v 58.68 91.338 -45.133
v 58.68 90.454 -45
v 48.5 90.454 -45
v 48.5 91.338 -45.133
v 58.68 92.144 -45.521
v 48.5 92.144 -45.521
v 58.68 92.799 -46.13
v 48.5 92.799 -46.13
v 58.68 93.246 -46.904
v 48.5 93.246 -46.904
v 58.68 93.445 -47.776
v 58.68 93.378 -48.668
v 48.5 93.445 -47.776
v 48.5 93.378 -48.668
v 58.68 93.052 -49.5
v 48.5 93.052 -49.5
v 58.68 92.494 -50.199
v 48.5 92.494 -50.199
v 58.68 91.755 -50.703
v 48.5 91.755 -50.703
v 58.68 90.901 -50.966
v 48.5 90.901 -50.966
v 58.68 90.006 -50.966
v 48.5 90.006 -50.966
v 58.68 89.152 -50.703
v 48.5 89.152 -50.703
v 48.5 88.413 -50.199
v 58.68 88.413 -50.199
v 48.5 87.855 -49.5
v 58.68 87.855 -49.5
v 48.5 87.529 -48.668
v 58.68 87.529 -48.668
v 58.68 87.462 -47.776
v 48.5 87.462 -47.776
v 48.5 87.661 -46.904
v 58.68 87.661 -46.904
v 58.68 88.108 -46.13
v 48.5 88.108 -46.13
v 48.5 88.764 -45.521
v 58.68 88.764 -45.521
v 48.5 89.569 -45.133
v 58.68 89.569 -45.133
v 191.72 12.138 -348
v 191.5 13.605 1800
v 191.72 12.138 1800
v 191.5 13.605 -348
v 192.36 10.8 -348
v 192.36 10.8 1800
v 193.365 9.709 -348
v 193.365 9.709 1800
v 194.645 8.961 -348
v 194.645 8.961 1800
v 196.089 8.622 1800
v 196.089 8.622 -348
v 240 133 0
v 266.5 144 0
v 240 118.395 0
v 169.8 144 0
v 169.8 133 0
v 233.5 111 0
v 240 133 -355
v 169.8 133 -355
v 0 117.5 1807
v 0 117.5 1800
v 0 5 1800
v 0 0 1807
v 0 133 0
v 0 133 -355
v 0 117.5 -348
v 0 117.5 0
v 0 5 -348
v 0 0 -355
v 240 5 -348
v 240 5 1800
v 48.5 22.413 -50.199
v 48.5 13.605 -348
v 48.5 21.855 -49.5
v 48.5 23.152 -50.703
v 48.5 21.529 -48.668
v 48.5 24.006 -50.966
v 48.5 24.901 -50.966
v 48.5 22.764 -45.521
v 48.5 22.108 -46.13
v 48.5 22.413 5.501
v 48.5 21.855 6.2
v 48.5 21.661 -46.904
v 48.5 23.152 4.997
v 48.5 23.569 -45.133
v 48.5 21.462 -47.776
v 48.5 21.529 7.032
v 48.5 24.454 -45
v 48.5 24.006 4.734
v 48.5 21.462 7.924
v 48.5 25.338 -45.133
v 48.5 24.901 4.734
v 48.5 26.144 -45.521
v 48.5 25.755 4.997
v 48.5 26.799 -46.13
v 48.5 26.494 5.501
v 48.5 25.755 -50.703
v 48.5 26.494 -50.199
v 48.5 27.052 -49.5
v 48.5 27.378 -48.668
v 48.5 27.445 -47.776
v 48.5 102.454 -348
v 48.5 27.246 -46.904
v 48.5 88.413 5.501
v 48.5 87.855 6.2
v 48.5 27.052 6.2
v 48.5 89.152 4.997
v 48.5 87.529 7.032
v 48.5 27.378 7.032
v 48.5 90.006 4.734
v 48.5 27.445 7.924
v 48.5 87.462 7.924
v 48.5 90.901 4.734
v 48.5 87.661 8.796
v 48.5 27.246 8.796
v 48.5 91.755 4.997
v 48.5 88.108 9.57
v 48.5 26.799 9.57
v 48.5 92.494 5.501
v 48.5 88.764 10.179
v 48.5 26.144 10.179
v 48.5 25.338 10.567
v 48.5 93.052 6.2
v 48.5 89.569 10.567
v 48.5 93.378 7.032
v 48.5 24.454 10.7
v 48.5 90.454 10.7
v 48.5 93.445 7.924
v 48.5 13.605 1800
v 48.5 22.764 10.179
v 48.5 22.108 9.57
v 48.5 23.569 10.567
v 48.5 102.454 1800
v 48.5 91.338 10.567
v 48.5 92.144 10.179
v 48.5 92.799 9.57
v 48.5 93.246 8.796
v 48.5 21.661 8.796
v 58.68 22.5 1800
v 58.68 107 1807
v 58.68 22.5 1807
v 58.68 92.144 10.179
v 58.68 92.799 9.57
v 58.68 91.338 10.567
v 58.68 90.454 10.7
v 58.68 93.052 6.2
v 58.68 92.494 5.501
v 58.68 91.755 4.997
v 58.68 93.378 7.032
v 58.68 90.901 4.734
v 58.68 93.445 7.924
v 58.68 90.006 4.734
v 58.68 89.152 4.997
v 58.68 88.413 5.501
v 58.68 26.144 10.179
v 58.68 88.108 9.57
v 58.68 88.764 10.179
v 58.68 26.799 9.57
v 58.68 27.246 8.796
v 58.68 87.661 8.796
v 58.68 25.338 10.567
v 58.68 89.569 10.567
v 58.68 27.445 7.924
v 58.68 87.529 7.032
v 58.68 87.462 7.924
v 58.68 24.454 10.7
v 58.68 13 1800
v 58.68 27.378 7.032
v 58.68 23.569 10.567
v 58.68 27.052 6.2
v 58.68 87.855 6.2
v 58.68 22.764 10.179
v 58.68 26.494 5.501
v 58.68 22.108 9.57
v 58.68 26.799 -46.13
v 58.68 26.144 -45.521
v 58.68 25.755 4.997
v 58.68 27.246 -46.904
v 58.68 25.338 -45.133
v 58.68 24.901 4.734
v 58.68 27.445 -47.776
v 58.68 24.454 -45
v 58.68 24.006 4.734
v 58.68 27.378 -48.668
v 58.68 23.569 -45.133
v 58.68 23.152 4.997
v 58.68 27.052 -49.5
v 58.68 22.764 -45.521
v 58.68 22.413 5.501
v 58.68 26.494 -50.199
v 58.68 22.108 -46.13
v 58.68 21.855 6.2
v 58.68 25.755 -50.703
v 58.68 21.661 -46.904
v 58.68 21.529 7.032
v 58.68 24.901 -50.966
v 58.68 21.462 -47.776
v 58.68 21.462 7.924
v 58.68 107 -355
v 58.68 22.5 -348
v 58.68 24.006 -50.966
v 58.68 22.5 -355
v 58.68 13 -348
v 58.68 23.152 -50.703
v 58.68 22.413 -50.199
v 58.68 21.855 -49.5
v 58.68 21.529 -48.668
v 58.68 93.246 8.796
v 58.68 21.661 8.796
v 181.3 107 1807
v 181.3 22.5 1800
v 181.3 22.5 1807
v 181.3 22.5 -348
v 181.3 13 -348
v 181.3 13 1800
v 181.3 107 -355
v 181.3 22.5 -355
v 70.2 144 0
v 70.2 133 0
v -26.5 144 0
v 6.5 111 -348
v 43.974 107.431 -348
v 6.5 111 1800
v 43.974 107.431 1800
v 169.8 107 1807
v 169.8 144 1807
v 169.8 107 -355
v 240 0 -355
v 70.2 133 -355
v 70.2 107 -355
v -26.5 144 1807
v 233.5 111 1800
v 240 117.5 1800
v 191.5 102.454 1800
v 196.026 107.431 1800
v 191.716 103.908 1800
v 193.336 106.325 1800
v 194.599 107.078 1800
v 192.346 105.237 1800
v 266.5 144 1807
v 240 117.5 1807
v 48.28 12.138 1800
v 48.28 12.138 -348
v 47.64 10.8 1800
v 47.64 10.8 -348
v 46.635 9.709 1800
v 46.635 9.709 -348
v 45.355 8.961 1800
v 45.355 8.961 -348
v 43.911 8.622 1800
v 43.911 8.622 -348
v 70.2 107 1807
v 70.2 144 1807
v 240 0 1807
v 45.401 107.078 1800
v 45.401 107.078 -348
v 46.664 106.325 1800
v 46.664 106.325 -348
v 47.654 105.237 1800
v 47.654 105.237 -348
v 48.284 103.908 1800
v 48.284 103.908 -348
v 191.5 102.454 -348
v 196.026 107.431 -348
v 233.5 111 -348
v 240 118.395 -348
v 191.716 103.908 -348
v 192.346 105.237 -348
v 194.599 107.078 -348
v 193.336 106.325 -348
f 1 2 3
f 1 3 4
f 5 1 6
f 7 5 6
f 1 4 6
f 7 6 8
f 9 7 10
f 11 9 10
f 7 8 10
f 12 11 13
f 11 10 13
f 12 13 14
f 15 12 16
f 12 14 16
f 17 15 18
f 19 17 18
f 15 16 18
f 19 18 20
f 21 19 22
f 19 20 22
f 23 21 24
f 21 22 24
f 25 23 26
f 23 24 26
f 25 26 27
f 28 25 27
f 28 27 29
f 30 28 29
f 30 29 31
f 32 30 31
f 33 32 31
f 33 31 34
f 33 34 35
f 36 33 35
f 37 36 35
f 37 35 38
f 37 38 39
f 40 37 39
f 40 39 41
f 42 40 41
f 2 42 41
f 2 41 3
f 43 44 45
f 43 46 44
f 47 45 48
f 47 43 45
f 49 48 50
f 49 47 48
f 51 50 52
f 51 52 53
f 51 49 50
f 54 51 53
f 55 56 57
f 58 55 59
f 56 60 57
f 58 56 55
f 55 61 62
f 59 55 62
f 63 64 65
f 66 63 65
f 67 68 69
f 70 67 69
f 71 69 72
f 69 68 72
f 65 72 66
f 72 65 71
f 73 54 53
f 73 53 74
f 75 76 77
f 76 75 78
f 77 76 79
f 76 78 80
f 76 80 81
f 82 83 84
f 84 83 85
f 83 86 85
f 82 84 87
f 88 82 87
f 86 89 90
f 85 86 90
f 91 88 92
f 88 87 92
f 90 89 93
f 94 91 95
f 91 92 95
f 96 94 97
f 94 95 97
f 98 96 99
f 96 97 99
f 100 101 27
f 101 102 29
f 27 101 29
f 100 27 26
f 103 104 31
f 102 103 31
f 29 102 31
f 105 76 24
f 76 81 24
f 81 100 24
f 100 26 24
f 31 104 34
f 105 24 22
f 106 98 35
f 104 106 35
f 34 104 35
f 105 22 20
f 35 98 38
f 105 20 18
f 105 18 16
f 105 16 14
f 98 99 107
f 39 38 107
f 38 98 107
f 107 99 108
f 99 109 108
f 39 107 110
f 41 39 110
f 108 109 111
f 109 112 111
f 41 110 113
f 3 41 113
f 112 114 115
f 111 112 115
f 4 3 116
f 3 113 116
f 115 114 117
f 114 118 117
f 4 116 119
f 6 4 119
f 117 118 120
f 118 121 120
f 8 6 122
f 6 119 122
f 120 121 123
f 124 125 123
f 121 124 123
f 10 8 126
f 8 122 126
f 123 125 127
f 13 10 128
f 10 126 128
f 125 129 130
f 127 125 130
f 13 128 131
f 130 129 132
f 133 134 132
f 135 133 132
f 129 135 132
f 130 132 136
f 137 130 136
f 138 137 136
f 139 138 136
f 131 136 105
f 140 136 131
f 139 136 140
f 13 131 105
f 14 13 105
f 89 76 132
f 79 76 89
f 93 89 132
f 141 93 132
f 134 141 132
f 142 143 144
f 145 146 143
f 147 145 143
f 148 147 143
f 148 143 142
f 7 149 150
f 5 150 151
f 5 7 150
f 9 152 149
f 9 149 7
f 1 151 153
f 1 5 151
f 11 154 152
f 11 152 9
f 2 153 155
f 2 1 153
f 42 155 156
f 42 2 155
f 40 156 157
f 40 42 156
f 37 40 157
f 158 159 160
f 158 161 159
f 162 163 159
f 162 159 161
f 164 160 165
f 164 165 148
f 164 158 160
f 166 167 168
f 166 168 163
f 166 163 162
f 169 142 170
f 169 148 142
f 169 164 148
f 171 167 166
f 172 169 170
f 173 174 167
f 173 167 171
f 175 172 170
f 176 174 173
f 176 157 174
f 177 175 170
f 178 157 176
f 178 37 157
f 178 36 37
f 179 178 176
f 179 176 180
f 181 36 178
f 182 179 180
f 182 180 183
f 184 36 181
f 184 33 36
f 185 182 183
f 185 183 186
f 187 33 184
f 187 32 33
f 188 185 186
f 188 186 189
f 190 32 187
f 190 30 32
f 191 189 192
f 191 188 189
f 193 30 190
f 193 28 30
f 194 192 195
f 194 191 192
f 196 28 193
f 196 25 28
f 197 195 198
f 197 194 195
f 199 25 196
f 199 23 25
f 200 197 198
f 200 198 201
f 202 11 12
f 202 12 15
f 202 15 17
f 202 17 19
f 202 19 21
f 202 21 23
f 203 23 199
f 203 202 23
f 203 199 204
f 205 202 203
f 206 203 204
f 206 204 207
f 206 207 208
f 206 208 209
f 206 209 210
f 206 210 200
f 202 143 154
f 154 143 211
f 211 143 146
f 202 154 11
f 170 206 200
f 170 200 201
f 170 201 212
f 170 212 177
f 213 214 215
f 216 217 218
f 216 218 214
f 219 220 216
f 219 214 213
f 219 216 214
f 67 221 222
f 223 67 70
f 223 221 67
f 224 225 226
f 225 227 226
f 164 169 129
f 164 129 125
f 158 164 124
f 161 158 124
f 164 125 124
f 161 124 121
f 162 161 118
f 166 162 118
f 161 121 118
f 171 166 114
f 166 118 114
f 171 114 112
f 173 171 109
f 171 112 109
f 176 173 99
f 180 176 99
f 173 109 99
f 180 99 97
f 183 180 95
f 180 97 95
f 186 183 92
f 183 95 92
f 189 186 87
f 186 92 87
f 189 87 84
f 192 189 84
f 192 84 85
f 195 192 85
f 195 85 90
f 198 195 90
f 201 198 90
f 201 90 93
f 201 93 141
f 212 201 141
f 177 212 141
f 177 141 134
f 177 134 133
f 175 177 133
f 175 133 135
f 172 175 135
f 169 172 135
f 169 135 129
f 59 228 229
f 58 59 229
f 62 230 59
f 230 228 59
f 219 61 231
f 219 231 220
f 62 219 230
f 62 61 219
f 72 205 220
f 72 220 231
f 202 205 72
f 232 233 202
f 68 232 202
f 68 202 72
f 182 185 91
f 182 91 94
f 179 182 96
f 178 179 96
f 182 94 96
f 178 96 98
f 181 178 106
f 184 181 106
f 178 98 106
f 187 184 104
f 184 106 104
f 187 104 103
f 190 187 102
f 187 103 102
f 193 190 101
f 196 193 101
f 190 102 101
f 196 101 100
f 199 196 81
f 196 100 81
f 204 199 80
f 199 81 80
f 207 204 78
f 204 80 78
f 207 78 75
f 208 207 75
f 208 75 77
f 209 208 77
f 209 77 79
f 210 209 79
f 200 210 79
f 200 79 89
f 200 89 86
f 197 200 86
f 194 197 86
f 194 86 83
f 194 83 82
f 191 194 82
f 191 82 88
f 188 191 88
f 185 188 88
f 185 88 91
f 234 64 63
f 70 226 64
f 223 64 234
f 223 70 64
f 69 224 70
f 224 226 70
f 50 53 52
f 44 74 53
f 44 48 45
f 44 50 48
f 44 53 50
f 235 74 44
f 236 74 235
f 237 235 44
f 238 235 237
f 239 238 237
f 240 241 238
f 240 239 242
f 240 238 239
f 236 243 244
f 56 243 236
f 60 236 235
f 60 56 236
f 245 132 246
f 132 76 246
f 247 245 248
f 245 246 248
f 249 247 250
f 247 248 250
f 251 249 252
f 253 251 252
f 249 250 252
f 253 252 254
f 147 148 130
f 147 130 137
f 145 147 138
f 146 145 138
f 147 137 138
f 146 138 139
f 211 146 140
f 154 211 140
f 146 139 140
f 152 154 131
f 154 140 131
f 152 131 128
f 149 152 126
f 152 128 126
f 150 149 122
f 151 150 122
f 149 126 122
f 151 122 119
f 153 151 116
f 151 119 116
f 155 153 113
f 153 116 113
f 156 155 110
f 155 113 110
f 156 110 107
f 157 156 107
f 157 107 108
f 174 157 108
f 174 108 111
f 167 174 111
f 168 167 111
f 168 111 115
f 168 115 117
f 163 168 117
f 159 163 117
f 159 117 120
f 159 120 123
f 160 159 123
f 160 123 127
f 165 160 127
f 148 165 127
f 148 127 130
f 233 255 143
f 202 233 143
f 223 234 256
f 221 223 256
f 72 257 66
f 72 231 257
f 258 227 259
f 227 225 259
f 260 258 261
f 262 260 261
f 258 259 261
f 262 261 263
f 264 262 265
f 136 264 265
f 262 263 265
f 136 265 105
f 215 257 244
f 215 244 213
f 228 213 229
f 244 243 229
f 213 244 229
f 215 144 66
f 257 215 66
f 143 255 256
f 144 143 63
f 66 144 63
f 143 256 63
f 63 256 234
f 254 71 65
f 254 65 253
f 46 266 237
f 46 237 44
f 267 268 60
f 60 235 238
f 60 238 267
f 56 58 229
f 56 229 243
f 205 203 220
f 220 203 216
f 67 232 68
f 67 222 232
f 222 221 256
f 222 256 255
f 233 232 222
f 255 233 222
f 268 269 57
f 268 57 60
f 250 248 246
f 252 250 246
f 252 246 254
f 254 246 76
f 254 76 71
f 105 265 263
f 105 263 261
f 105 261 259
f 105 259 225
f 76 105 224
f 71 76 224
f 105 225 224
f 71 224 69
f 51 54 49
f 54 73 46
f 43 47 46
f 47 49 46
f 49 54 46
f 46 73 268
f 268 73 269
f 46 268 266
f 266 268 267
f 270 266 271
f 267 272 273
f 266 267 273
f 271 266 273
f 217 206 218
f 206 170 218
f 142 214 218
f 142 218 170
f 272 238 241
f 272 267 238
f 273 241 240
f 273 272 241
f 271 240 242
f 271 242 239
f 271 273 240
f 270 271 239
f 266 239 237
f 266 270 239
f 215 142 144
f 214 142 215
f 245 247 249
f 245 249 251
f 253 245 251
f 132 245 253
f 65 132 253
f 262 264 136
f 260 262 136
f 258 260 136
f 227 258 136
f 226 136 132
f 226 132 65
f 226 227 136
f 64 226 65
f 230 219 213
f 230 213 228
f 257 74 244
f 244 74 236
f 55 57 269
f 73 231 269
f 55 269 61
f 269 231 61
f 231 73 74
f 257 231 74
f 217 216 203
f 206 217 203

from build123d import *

# Parameters (mm, degrees)
DODANIE_WYCI_GNI_CIE1_DEPTH = 1800
DODANIE_WYCI_GNI_CIE2_DEPTH = 348
DODANIE_WYCI_GNI_CIE3_DEPTH = 7
DODANIE_WYCI_GNI_CIE5_DEPTH = 7
ZAOKR_GLENIE1_R             = 5
SZKIC16_R                   = 3
WYTNIJ_WYCI_GNI_CIE1_DEPTH  = 10.2


with BuildPart() as part:
    # Szkic4 → Dodanie-wyciągnięcie1 (new body)
    with BuildSketch(Plane.XY):
        Polygon((0, 0), (0, 5), (48.5, 9), (48.5, 107), (6.5, 111), (-26.5, 144), (70.2, 144), (70.2, 107), (58.679571348, 107), (58.679571348, 13), (181.3, 13), (181.3, 107), (169.8, 107), (169.8, 144), (266.5, 144), (233.5, 111), (191.5, 107), (191.5, 9), (240, 5), (240, 0), align=None)
    extrude(amount=DODANIE_WYCI_GNI_CIE1_DEPTH)

    # Szkic5 → Dodanie-wyciągnięcie2 (add)
    with BuildSketch(Plane.XY):
        Polygon((0, 0), (0, 5), (48.5, 9), (48.5, 107), (6.5, 111), (0, 117.5), (0, 133), (6.5, 133), (70.2, 133), (70.2, 107), (58.679571348, 107), (58.679571348, 13), (181.3, 13), (181.3, 107), (169.8, 107), (169.8, 133), (233.5, 133), (240, 133), (240, 118.39460416), (233.5, 111), (191.5, 107), (191.5, 9), (240, 5), (240, 0), align=None)
    extrude(amount=-DODANIE_WYCI_GNI_CIE2_DEPTH)

    # Szkic10 → Dodanie-wyciągnięcie3 (add)
    with BuildSketch(Plane.XY.offset(-348)):
        Polygon((0, 0), (0, 117.5), (0, 133), (6.5, 133), (70.2, 133), (70.2, 107), (58.679571348, 107), (58.679571348, 22.5), (181.3, 22.5), (181.3, 107), (169.8, 107), (169.8, 133), (233.5, 133), (240, 133), (240, 118.39460416), (240, 0), align=None)
    extrude(amount=-DODANIE_WYCI_GNI_CIE3_DEPTH)

    # Szkic11 → Dodanie-wyciągnięcie5 (add)
    with BuildSketch(Plane.XY.offset(1800)):
        Polygon((0, 0), (0, 5), (0, 117.5), (-26.5, 144), (70.2, 144), (70.2, 107), (58.679571348, 107), (58.679571348, 22.5), (181.3, 22.5), (181.3, 107), (169.8, 107), (169.8, 144), (266.5, 144), (240, 117.5), (240, 5), (240, 0), align=None)
    extrude(amount=DODANIE_WYCI_GNI_CIE5_DEPTH)

    # Zaokrąglenie1
    zaokr_glenie1_edges = [part.edges().sort_by_distance(p)[0] for p in [
        (48.5, 107, 726),
        (48.5, 9, 726),
        (191.5, 9, 726),
        (191.5, 107, 726),
    ]]
    fillet(zaokr_glenie1_edges, radius=ZAOKR_GLENIE1_R)

    # Szkic16 → Wytnij-wyciągnięcie1 (cut)
    with BuildSketch(Plane.ZY.offset(-48.5)):
        with Locations((-48, 90.453565926)):
            Circle(SZKIC16_R)
        with Locations((7.7, 90.453565926)):
            Circle(SZKIC16_R)
        with Locations((7.7, 24.453565926)):
            Circle(SZKIC16_R)
        with Locations((-48, 24.453565926)):
            Circle(SZKIC16_R)
    extrude(amount=-WYTNIJ_WYCI_GNI_CIE1_DEPTH, mode=Mode.SUBTRACT)


solid = part.part
